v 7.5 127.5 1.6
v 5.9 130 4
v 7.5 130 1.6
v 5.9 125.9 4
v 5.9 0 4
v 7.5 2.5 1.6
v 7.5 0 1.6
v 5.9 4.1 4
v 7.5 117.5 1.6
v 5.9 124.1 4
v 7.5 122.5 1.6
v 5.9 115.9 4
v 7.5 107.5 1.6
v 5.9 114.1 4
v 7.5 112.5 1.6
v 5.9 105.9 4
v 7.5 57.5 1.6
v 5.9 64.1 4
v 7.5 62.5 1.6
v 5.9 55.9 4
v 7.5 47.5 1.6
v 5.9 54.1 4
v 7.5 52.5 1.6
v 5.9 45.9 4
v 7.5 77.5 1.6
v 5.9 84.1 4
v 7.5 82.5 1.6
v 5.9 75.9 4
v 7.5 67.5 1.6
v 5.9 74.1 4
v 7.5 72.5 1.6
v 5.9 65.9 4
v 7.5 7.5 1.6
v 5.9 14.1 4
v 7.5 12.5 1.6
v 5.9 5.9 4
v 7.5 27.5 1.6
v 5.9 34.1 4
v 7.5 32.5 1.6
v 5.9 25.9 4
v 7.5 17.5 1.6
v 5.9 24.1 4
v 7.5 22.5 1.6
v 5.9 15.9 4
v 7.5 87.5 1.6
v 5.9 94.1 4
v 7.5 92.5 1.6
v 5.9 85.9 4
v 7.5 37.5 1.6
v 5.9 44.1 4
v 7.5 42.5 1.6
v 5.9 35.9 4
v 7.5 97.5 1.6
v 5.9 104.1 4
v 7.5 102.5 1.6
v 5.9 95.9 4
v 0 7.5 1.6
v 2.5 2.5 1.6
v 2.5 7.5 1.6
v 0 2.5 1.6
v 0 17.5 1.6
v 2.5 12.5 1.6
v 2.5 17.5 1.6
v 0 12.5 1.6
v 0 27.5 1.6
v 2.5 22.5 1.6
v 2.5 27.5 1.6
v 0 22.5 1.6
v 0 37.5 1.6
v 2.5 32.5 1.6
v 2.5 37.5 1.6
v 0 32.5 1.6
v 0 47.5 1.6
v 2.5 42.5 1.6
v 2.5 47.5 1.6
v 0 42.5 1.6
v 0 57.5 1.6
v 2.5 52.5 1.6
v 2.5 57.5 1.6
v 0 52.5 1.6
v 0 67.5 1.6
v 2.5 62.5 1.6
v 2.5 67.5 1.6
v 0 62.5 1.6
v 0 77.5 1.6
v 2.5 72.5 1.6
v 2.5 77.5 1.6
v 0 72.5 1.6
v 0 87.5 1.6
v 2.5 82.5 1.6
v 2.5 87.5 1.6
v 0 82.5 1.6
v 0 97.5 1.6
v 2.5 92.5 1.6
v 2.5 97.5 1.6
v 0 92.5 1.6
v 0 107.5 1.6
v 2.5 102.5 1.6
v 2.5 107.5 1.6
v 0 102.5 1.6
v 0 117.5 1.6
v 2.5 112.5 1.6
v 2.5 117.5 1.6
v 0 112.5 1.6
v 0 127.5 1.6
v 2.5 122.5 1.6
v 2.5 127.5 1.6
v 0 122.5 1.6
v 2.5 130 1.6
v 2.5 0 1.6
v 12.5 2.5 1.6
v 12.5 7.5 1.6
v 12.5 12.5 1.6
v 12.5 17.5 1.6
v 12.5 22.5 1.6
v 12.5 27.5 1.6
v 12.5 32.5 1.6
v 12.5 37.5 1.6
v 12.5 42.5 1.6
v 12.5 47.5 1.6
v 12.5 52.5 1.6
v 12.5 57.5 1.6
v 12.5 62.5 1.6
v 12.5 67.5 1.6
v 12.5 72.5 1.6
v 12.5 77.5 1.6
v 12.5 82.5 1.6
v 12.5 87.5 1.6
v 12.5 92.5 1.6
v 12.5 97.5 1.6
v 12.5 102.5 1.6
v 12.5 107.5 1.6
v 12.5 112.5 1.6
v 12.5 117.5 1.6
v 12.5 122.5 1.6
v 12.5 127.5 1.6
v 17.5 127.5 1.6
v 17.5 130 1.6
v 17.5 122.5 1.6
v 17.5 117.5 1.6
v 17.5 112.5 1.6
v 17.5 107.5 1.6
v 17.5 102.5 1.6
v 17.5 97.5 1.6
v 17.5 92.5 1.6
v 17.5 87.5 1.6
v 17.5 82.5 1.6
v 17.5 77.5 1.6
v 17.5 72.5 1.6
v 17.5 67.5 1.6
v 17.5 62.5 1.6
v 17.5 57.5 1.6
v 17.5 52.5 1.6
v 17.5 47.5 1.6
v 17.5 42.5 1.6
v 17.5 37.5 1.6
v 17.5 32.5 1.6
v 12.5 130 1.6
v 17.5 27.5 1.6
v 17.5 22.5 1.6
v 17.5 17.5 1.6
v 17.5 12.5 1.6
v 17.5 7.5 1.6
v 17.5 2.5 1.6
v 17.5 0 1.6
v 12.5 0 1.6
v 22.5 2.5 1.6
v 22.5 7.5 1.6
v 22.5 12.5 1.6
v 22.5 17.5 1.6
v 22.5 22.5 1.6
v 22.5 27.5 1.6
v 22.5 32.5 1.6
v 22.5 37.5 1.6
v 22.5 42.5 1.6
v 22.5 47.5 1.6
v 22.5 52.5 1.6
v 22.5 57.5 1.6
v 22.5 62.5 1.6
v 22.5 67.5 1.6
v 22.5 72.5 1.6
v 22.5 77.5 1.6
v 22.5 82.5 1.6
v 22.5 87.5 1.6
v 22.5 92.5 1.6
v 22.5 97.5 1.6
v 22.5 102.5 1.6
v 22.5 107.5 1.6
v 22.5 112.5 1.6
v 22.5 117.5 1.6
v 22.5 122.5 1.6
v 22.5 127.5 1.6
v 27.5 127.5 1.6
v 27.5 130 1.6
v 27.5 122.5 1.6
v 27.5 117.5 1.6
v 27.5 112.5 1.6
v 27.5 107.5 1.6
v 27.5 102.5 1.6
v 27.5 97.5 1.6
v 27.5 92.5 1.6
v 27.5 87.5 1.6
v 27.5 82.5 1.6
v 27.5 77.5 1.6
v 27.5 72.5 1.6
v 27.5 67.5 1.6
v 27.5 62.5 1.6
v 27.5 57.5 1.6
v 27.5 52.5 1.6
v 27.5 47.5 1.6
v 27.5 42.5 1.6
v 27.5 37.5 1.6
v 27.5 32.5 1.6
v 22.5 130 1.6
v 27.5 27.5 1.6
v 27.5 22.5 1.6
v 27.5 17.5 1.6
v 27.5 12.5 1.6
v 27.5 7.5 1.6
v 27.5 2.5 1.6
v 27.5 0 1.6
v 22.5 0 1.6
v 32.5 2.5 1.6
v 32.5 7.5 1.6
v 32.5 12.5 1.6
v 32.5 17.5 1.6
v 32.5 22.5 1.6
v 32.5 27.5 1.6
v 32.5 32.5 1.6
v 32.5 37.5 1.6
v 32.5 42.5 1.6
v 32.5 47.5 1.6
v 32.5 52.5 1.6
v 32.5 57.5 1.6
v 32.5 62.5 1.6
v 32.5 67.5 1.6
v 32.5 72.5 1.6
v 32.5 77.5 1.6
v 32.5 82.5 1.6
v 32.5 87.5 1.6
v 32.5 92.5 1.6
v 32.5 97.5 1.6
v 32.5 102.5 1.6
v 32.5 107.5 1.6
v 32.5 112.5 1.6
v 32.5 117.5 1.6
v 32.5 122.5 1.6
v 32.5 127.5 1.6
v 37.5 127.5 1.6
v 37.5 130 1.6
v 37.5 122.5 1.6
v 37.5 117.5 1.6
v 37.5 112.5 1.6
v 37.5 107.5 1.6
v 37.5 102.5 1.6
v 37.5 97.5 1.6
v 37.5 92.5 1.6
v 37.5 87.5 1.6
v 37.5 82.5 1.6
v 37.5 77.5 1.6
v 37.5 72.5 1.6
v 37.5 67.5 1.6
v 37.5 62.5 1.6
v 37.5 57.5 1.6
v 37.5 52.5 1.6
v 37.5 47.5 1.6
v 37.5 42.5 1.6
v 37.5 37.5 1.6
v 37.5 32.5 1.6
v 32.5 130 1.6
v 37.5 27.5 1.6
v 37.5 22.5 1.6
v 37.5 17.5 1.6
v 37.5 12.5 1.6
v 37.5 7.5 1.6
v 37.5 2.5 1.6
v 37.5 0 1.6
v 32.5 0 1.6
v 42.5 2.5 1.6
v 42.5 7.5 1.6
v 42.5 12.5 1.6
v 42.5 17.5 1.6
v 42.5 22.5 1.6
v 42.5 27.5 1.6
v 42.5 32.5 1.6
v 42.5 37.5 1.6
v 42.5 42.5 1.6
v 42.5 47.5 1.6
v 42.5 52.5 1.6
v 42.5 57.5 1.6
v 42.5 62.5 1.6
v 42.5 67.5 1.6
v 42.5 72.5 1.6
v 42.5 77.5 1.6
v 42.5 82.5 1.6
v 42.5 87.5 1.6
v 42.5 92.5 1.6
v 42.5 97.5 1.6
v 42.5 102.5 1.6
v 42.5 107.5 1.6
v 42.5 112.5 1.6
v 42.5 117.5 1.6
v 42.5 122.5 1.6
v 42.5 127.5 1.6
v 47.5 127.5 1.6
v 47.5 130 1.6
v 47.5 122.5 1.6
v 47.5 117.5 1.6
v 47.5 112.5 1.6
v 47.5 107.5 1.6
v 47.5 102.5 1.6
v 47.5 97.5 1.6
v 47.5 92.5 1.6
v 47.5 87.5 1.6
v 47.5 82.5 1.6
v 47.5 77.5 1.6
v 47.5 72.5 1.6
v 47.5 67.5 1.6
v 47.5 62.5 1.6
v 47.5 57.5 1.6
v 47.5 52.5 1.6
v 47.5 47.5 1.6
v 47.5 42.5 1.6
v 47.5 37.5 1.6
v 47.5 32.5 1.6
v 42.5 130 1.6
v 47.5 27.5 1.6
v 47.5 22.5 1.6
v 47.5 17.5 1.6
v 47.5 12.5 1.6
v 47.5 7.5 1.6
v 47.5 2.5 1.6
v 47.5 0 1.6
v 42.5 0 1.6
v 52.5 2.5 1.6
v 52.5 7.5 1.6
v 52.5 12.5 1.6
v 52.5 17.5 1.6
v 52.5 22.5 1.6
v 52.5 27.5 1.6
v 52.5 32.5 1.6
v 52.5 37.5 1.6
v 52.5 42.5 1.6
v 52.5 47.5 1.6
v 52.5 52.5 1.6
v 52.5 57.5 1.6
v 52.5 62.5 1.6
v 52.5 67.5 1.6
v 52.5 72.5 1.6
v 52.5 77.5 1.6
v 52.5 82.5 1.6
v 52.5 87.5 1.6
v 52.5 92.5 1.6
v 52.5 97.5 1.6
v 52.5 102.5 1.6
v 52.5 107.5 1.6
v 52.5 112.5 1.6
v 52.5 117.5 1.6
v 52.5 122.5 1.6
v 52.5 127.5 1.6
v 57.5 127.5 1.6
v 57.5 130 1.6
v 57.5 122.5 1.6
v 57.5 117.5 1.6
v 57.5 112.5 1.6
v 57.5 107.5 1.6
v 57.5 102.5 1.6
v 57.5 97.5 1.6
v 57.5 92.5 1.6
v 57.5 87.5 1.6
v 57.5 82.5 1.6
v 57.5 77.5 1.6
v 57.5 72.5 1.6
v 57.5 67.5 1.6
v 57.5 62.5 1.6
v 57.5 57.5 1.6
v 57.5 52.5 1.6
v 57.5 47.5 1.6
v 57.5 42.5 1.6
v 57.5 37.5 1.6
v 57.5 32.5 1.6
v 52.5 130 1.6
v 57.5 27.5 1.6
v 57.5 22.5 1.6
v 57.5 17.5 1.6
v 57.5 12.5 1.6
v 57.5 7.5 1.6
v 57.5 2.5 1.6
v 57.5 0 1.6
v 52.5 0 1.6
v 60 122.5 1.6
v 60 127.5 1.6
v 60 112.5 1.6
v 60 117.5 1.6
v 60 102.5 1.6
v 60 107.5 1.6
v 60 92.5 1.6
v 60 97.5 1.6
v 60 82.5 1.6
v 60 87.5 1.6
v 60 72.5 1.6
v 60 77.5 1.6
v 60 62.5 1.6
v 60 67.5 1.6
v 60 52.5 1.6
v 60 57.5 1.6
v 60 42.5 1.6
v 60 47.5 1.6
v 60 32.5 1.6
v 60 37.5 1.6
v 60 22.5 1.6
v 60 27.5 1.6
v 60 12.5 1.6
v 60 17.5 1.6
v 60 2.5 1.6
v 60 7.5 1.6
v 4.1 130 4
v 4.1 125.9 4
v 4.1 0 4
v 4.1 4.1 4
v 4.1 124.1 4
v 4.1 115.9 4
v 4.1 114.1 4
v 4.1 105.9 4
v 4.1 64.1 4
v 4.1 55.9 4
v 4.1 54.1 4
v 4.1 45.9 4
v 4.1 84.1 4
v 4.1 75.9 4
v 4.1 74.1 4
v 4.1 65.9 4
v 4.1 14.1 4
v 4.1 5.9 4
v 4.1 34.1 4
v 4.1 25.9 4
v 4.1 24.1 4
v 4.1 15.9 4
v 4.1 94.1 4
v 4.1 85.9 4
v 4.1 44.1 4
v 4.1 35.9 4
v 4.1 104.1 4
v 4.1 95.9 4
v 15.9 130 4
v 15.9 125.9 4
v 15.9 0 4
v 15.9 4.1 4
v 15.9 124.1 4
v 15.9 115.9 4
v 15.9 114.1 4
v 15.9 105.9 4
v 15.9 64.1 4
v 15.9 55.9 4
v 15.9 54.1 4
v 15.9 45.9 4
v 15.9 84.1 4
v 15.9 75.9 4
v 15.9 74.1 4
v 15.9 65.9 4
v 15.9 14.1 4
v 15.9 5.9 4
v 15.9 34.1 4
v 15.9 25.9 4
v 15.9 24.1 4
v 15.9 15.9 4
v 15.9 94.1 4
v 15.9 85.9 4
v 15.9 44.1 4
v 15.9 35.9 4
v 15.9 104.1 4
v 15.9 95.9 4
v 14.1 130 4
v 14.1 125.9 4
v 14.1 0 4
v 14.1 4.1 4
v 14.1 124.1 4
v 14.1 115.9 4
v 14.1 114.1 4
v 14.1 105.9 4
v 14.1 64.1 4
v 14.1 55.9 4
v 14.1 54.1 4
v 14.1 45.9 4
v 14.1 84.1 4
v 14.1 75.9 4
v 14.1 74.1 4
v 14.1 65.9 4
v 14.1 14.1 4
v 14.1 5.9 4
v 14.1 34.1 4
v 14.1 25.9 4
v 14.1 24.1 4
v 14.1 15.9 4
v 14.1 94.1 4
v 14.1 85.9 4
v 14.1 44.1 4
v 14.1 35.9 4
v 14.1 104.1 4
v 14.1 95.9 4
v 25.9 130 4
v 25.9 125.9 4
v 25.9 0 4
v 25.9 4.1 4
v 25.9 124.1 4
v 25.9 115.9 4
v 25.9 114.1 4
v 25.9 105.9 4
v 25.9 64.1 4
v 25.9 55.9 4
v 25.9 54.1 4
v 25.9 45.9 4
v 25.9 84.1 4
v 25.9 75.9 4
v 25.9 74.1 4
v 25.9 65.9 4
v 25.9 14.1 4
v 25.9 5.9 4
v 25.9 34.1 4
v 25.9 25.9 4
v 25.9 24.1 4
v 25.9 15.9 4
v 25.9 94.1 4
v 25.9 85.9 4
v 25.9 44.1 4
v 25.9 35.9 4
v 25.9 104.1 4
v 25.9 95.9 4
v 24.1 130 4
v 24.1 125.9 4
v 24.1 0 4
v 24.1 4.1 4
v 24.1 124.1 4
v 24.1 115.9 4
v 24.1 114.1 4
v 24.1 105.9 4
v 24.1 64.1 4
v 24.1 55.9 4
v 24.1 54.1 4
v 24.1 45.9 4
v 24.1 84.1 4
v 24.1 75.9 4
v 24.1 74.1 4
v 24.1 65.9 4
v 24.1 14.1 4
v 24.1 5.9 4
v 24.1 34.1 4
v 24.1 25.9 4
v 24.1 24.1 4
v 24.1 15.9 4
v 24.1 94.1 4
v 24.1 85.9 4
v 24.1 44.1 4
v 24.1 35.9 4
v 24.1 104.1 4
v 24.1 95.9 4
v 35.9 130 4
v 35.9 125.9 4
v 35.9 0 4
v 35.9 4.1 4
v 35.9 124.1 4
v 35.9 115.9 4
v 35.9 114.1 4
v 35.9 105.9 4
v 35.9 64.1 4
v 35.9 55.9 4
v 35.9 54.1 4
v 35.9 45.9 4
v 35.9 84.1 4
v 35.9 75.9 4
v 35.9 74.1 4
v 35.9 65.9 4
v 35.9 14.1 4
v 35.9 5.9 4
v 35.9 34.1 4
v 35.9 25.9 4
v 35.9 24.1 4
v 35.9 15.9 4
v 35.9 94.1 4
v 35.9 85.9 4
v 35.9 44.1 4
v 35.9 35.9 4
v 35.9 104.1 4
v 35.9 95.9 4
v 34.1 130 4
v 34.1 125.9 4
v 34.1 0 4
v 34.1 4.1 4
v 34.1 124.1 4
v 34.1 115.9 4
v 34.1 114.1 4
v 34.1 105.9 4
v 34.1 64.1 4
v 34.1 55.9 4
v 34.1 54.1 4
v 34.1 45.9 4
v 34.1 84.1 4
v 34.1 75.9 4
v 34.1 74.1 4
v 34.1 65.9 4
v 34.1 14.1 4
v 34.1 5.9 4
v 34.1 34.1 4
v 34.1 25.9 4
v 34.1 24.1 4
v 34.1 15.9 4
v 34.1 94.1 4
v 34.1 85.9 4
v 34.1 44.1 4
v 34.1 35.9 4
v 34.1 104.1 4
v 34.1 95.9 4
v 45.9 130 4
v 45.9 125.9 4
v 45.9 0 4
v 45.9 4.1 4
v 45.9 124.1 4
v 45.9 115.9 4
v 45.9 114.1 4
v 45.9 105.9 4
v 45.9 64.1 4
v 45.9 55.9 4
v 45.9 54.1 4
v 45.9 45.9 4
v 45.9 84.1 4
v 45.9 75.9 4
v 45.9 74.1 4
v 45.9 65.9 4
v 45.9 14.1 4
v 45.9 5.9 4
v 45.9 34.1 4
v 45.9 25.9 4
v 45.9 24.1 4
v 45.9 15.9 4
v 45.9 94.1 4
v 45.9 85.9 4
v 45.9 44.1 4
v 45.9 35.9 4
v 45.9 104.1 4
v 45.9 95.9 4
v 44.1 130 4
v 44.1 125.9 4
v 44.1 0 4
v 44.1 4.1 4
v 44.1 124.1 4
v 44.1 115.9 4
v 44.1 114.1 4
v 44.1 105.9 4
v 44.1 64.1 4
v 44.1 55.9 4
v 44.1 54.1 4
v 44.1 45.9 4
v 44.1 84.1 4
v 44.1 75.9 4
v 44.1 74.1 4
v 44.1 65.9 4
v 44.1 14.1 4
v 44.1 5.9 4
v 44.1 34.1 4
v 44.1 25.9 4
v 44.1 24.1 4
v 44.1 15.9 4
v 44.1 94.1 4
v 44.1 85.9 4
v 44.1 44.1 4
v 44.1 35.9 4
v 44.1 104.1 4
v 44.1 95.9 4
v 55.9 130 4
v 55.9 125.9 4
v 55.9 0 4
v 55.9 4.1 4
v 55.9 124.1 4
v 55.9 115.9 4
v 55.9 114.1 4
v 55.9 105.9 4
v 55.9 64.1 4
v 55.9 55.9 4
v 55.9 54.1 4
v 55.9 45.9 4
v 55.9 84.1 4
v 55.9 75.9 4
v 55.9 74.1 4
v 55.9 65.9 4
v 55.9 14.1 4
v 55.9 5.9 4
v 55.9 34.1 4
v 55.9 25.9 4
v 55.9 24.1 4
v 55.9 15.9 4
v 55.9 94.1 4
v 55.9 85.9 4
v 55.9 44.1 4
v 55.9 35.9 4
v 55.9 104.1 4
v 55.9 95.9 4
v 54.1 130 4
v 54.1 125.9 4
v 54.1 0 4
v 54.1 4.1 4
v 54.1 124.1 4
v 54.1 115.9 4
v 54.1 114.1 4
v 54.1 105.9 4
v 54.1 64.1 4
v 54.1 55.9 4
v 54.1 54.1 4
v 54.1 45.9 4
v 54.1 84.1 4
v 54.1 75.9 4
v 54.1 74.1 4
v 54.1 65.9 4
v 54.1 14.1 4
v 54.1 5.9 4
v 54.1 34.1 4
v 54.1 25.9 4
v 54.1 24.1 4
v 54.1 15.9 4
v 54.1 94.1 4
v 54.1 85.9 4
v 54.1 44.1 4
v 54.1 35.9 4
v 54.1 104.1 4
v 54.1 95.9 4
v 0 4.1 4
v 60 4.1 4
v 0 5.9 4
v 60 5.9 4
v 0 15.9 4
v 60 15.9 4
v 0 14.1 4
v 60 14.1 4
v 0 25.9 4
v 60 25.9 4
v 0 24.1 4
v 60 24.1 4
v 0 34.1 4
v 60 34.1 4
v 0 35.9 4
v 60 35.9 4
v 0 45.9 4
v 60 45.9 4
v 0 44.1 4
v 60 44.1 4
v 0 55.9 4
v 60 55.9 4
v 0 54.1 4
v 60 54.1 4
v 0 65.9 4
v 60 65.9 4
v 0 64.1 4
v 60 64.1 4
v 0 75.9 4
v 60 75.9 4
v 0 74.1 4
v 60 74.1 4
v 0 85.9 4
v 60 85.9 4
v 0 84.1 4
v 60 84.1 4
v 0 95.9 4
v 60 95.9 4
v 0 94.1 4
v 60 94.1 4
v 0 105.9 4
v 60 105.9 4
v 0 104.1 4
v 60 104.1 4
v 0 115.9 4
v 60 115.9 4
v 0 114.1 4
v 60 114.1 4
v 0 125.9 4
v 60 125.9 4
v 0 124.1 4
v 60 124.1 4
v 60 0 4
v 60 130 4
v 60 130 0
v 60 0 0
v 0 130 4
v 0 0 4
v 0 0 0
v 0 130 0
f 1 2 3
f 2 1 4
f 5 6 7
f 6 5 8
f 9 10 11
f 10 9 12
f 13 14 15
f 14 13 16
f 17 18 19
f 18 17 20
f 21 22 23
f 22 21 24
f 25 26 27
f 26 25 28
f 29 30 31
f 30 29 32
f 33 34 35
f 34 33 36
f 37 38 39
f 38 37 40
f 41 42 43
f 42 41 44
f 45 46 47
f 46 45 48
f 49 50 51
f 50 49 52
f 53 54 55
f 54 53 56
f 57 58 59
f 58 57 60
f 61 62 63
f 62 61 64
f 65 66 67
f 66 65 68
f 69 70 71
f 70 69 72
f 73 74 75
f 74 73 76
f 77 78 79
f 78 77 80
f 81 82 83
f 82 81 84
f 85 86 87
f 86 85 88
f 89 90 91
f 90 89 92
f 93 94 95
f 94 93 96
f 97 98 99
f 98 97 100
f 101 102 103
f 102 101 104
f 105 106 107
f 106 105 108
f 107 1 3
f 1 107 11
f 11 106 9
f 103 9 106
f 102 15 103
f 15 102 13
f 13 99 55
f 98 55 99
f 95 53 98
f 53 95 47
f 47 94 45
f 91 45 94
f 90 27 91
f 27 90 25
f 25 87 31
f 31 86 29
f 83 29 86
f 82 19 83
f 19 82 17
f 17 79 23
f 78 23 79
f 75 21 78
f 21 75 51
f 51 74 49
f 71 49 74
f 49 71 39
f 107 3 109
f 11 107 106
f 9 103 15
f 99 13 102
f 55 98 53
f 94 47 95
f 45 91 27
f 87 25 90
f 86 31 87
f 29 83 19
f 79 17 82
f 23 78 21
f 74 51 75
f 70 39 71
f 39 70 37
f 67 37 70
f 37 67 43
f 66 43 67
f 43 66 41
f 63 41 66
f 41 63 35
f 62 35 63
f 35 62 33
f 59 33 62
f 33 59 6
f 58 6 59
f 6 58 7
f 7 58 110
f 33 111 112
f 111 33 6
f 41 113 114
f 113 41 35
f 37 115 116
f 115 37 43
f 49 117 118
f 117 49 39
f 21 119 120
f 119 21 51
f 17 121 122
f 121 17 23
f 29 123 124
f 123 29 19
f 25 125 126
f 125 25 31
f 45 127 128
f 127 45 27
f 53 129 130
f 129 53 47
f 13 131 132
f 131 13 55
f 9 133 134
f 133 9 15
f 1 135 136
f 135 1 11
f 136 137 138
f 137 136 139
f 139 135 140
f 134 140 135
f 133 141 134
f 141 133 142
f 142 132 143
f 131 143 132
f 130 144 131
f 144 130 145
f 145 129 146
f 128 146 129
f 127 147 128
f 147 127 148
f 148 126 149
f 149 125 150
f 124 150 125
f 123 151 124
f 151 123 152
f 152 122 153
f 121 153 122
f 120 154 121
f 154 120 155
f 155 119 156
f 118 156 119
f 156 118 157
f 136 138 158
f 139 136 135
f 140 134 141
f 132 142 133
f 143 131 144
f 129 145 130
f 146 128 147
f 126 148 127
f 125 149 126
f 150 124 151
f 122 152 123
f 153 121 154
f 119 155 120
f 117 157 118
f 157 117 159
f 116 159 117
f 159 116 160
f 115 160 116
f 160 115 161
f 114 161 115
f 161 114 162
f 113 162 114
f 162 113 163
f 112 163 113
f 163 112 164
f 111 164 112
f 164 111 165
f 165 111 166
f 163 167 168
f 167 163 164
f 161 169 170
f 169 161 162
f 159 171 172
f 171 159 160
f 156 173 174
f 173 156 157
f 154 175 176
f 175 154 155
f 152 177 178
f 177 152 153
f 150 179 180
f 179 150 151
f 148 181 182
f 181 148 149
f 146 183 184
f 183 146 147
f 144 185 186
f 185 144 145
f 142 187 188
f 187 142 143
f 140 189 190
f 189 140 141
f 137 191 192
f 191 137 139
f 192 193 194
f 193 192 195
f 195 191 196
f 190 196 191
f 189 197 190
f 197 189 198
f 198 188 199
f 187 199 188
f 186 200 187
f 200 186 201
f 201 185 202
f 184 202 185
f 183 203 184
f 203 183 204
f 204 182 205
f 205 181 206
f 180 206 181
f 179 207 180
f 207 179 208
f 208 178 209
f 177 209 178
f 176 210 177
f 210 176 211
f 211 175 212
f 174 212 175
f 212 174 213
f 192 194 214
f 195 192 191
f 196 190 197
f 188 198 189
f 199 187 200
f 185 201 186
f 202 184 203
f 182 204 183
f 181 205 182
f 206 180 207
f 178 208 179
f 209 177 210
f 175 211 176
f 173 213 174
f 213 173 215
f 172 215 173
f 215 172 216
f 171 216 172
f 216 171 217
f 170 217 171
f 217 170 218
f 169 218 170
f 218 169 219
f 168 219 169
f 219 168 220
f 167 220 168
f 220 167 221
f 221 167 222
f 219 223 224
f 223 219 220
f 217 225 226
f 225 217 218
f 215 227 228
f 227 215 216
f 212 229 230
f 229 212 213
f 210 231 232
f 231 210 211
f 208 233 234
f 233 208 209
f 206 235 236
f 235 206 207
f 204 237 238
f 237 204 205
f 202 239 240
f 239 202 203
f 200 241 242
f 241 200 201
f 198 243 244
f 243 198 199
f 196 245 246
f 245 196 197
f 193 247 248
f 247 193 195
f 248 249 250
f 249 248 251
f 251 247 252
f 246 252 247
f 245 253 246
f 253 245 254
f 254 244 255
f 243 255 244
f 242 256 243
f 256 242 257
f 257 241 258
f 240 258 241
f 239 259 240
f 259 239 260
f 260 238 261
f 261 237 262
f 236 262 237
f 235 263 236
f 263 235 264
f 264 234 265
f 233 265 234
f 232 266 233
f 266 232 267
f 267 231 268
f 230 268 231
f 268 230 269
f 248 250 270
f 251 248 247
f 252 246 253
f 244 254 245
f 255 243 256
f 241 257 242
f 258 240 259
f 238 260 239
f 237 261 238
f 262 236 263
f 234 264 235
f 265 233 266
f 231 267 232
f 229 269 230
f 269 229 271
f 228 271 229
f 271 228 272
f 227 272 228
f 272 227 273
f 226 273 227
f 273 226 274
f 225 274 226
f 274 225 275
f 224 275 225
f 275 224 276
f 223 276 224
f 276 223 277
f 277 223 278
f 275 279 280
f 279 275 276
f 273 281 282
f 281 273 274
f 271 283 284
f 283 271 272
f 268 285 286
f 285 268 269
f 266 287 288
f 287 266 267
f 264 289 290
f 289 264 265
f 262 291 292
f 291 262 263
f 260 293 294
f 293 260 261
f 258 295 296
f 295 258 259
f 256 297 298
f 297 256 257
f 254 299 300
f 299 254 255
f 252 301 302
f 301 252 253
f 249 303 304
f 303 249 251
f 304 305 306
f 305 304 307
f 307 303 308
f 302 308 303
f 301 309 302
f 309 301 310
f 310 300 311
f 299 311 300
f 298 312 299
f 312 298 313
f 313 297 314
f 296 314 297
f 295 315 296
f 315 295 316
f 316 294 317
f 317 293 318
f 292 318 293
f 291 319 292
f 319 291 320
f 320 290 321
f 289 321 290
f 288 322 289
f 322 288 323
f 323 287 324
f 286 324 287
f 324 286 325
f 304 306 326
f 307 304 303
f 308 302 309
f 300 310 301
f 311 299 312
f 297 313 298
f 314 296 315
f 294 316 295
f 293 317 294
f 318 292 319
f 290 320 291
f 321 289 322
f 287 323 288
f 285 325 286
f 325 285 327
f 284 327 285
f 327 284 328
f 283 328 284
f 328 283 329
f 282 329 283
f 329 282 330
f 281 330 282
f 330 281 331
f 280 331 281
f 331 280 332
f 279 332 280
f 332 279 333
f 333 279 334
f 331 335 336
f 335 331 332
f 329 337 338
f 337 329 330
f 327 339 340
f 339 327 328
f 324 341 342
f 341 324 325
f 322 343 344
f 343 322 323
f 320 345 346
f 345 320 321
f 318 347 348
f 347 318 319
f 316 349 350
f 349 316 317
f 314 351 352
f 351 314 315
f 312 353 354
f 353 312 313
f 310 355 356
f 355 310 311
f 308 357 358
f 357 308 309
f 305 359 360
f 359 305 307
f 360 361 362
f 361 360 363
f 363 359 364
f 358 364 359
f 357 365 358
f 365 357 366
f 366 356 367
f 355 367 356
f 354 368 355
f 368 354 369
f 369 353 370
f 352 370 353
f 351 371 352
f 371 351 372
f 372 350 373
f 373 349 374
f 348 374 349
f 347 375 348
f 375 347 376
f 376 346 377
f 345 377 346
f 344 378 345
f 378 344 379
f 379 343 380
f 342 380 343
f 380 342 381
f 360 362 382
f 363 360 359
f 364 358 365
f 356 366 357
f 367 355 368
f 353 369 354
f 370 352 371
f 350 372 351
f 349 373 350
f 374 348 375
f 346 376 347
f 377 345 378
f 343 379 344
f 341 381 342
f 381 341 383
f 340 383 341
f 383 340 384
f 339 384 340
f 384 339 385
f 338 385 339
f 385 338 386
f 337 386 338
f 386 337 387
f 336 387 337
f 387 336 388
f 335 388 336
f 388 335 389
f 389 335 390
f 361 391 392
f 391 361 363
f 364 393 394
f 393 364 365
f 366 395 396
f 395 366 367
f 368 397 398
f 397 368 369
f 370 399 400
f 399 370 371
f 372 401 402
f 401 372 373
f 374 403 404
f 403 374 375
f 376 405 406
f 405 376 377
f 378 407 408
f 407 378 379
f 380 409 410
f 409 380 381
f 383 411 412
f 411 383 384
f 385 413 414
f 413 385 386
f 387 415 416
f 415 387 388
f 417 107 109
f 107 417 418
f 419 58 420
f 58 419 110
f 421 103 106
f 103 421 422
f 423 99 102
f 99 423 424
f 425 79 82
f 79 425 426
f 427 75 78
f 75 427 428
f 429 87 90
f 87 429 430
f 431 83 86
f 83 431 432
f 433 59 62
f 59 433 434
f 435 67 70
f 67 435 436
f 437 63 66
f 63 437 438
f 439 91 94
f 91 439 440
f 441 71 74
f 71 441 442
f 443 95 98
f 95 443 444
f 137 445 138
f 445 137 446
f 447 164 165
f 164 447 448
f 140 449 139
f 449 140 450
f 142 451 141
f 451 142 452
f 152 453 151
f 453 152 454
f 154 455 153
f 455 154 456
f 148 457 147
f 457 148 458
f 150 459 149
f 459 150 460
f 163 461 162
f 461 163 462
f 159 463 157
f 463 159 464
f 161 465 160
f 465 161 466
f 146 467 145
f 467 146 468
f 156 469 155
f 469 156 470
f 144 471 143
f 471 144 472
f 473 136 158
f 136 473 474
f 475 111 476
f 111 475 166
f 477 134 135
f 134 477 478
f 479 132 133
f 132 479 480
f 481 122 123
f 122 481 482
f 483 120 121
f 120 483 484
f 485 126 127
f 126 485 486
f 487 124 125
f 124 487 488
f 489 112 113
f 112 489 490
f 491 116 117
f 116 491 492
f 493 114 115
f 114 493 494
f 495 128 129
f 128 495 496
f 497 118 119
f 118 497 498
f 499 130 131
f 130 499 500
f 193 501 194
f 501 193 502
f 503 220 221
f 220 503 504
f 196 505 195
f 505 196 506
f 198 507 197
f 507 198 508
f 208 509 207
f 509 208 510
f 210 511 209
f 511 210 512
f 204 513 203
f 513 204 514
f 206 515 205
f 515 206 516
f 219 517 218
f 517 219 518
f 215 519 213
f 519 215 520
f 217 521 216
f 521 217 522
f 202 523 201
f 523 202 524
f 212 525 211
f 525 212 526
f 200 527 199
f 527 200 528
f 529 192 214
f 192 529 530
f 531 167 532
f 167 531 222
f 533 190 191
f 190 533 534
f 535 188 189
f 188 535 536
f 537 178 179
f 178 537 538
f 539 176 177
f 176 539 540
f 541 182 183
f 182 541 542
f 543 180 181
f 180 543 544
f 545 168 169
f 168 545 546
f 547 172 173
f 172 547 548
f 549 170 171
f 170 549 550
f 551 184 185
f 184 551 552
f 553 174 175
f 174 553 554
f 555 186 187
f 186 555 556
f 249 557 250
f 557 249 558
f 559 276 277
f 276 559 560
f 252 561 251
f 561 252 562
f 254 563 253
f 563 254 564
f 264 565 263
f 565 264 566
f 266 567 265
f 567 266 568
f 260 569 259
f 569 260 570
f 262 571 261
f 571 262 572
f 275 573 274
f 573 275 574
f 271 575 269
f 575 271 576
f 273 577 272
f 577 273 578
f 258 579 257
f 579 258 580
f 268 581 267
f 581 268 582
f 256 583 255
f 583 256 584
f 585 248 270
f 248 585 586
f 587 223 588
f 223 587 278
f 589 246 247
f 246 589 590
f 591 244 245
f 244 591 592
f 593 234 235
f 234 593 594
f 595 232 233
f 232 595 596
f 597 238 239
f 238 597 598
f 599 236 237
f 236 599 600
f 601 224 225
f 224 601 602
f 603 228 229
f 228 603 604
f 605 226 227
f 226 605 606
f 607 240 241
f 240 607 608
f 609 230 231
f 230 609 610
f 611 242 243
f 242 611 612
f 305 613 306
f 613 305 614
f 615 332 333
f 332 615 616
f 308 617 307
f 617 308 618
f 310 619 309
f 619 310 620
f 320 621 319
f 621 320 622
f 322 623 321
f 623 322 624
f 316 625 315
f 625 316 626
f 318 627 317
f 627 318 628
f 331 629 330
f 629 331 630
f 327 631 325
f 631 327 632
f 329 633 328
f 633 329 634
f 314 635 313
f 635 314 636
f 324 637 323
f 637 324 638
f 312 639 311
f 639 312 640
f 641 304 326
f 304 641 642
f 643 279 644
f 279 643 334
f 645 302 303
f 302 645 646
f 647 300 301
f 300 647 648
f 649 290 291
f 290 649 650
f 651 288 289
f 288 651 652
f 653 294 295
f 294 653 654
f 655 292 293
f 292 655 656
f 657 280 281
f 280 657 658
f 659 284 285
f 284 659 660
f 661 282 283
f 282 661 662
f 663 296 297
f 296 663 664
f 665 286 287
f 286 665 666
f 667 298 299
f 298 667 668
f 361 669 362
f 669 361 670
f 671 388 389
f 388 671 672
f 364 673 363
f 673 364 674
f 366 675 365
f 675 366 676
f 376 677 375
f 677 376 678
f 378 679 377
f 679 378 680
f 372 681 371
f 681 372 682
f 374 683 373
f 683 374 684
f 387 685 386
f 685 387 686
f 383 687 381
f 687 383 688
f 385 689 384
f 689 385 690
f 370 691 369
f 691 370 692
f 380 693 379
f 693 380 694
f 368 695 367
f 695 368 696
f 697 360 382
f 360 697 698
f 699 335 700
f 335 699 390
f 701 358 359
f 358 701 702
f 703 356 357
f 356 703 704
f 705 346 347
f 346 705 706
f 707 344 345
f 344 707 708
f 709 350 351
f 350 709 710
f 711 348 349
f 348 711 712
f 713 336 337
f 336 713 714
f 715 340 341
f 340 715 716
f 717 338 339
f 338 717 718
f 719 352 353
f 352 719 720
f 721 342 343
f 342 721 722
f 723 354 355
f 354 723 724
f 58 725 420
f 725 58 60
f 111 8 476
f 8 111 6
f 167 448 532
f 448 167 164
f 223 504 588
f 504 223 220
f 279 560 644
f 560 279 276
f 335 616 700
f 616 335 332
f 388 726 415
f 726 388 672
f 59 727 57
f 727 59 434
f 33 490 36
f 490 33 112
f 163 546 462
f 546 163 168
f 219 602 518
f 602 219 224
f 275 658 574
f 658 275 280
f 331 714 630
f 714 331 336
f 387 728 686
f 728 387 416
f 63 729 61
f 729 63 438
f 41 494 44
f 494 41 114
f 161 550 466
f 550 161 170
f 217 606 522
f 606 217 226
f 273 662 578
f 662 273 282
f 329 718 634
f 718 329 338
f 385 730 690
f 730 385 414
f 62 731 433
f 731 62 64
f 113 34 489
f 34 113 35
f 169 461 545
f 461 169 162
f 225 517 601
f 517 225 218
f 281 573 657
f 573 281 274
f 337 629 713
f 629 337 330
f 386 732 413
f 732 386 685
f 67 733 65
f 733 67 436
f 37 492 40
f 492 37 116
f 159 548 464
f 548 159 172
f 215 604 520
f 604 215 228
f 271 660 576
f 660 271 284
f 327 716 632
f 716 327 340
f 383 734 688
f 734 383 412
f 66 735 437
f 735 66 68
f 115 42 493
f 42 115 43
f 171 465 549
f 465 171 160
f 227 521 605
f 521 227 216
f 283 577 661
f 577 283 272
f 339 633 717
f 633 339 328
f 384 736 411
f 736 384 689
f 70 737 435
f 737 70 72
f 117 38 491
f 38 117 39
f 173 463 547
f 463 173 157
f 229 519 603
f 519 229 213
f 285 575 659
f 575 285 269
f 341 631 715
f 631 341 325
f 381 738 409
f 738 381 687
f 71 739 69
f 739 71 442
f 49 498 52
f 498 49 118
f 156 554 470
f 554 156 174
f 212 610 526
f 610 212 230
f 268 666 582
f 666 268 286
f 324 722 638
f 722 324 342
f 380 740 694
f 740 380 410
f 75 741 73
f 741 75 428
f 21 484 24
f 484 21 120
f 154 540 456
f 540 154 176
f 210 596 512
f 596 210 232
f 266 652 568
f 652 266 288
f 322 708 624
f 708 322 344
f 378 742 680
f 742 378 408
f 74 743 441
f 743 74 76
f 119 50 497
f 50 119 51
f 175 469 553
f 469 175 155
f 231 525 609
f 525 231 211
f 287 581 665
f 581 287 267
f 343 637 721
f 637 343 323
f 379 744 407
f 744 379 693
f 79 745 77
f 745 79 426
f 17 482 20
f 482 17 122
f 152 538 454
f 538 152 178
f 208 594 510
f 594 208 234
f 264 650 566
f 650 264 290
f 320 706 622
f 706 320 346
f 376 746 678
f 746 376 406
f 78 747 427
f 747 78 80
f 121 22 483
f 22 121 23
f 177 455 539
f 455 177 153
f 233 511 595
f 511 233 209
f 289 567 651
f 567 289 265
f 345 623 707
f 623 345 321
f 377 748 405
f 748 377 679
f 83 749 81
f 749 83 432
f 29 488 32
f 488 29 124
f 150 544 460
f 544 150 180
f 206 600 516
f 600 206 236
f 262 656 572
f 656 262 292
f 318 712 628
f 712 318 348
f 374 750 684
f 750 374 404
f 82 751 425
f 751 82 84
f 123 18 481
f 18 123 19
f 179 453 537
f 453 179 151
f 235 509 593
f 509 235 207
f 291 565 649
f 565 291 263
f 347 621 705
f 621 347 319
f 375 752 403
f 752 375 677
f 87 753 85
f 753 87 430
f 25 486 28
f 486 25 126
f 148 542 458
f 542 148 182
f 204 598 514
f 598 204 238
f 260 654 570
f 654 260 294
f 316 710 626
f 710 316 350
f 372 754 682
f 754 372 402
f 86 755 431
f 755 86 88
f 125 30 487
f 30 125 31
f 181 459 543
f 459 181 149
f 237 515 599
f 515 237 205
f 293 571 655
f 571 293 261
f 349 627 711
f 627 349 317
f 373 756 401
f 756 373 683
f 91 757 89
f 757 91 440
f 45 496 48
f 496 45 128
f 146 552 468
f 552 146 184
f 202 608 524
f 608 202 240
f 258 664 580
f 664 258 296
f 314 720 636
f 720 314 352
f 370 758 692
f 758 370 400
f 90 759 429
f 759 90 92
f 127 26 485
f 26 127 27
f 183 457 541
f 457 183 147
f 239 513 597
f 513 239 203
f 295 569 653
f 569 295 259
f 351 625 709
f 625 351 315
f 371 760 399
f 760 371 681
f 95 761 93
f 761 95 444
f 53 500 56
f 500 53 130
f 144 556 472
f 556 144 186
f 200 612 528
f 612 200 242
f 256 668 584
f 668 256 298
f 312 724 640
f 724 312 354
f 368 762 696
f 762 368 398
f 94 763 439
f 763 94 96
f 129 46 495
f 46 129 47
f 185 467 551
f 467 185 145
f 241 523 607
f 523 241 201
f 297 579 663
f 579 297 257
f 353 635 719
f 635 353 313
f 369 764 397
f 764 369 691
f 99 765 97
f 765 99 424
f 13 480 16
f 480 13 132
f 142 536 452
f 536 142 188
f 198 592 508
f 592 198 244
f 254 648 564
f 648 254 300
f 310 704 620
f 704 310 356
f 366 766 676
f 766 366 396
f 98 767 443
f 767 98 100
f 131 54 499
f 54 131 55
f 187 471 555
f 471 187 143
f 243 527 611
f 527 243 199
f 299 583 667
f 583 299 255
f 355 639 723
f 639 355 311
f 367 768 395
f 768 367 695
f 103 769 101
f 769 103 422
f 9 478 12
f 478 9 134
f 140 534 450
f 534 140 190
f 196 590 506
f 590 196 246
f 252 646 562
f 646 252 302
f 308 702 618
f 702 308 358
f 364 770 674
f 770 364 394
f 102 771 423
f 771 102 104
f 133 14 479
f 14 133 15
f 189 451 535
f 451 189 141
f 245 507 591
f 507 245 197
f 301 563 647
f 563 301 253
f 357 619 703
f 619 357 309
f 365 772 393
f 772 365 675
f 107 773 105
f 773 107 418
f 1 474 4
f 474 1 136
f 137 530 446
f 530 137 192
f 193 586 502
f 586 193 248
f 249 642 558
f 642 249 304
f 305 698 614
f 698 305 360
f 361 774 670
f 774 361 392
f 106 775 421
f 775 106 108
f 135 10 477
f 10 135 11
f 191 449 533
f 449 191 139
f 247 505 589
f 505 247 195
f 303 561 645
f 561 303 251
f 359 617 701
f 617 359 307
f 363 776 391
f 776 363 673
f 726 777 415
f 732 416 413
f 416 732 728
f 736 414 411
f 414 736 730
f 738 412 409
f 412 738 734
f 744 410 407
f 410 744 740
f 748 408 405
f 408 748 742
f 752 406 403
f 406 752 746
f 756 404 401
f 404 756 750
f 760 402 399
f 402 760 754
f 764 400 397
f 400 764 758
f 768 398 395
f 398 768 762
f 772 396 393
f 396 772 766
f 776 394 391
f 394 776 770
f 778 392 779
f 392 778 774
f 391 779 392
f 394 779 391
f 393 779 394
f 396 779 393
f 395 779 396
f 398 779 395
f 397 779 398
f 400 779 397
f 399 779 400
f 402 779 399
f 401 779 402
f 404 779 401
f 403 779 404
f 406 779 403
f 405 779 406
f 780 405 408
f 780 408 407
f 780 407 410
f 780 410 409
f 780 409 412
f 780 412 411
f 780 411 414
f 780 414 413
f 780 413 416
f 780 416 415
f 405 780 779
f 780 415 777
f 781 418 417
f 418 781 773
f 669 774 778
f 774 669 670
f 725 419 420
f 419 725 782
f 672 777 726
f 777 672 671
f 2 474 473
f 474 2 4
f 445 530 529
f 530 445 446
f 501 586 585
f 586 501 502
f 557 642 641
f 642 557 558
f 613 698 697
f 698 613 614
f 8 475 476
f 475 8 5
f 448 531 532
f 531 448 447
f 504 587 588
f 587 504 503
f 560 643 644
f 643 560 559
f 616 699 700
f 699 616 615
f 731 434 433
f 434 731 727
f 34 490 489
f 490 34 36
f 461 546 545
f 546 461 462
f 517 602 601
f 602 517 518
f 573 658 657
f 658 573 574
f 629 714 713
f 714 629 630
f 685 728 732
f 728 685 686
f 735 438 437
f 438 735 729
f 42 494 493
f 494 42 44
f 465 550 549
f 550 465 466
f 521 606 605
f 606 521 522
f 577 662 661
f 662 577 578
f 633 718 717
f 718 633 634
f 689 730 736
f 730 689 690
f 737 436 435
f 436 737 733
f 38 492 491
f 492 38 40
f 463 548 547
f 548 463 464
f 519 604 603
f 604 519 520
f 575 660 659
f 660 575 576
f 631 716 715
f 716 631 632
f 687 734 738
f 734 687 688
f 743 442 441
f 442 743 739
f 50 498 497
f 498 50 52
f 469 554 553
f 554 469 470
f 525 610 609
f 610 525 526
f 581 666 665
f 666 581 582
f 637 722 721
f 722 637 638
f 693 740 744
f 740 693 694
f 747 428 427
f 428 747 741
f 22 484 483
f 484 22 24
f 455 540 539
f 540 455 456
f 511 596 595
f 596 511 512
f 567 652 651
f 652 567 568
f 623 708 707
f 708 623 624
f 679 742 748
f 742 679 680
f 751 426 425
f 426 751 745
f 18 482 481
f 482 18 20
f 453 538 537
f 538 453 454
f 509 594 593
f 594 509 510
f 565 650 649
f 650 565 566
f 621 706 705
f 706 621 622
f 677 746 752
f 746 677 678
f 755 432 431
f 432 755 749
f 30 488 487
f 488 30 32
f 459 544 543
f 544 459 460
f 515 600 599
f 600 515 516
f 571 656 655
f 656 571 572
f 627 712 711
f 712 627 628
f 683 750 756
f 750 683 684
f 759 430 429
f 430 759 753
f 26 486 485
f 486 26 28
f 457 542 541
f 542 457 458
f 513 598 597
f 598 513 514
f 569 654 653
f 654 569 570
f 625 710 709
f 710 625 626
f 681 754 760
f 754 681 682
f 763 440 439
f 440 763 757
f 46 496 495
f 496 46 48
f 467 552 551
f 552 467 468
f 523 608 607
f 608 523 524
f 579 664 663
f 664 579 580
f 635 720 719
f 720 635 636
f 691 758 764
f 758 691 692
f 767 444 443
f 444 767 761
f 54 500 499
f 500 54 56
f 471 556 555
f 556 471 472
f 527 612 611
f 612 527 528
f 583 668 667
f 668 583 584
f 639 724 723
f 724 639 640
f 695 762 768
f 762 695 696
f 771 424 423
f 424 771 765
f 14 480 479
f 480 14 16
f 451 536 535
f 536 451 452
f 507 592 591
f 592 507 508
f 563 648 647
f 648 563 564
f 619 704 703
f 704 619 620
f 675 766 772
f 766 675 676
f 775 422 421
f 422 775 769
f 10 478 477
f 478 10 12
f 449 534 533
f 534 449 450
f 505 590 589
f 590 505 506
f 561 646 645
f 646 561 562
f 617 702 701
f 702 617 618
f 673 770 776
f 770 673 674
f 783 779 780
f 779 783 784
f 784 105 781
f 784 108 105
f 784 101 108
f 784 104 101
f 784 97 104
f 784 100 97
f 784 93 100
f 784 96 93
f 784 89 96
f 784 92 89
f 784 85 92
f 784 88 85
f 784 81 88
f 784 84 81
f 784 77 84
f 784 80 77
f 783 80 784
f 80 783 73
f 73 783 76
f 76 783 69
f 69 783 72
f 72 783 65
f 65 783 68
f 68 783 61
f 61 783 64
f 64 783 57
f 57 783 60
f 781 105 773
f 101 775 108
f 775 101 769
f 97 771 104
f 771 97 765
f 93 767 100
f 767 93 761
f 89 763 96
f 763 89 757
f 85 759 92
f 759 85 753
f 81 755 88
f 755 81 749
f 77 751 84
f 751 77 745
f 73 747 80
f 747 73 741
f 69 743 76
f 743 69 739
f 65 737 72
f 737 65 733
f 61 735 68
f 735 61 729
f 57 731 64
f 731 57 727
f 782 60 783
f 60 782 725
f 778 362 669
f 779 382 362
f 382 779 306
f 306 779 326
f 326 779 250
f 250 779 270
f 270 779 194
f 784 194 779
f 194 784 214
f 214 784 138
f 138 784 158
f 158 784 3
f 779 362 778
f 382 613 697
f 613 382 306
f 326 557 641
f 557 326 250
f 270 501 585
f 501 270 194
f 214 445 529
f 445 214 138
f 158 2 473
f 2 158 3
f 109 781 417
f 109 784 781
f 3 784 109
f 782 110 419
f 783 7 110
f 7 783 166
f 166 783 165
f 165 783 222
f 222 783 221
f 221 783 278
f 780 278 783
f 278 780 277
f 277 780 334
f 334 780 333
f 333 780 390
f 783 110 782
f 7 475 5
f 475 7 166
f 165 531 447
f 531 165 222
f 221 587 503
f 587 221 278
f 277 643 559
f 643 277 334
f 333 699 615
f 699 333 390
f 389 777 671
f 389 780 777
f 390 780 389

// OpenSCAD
// file: common.scad
inch_to_mm = 25.4;

margin=0.1;
bigscrew_attach_hole_diameter= 2.44;
bigscrew_diameter = 2.54;
bigscrew_head_diameter = 5;
bigscrew_head_height = 2.1;
// file: board_config.scad
rail_position=20;
rail_height=2.5;
rail_width=5;
mainboard_width=60;
mainboard_height=130;
mainboard_thickness=4;
mainboard_spacing=10;
deep_holes_spacing=10;
rails=4;


board_attacher_width=4;
board_attacher_height=55;
board_attacher_length=30;

side_panel_height = board_attacher_height + 2*mainboard_thickness;
side_panel_thickness=2;
side_panel_ticks=2;

front_panel_height = board_attacher_height + 2*mainboard_thickness;
front_panel_thickness=2;
front_panel_ticks=2;
front_panel_width = mainboard_height + 2*side_panel_thickness;
// file: dovetail.scad
module dovetail_shape(width, height, length) {
    translate([-width/2,0,0]) linear_extrude(height = length) {
        polygon([[0, 0], [width, 0], [width - width/3, height], [width/3, height]]);
    }
}

module rail(male=false, width, height, length, default_offset=0.2) {
    // male will reduce the width slightly
    offset = male ? default_offset : 0;
    
    translate([0,0,-height+offset]) rotate([90,0,0]) dovetail_shape(width-2*offset,height-offset,length);
}
// main file
include <dovetail.scad>;
include <board_config.scad>;
include <common.scad>;

// mainboard

module mainboard(holes=false) {
    difference() {
        cube([mainboard_width,mainboard_height,mainboard_thickness]);
        // rails h
        for (i=[1:mainboard_width/mainboard_spacing]) 
            translate([i*mainboard_spacing-mainboard_spacing/2,mainboard_height+margin,mainboard_thickness+margin]) rail(false, rail_width, rail_height, mainboard_height+2*margin);
        // rails v
        for (i=[1:mainboard_height/mainboard_spacing]) 
            translate([-margin,i*mainboard_spacing-mainboard_spacing/2,mainboard_thickness+margin]) rotate([0,0,90]) rail(false, rail_width, rail_height, mainboard_width+2*margin);
        if (holes) {
        for (x=[1:mainboard_width/deep_holes_spacing-1]) 
            for (y=[1:mainboard_height/deep_holes_spacing-1]) 
                union() {
                    translate([x*deep_holes_spacing,y*deep_holes_spacing,-margin]) 
                        cylinder(mainboard_thickness+2*margin,d=bigscrew_diameter, $fn=50);
                    translate([x*deep_holes_spacing,y*deep_holes_spacing,-margin]) 
                        cylinder(bigscrew_head_height+2*margin,d=bigscrew_head_diameter, $fn=50);
                }    
        }
    }
}

mainboard();
